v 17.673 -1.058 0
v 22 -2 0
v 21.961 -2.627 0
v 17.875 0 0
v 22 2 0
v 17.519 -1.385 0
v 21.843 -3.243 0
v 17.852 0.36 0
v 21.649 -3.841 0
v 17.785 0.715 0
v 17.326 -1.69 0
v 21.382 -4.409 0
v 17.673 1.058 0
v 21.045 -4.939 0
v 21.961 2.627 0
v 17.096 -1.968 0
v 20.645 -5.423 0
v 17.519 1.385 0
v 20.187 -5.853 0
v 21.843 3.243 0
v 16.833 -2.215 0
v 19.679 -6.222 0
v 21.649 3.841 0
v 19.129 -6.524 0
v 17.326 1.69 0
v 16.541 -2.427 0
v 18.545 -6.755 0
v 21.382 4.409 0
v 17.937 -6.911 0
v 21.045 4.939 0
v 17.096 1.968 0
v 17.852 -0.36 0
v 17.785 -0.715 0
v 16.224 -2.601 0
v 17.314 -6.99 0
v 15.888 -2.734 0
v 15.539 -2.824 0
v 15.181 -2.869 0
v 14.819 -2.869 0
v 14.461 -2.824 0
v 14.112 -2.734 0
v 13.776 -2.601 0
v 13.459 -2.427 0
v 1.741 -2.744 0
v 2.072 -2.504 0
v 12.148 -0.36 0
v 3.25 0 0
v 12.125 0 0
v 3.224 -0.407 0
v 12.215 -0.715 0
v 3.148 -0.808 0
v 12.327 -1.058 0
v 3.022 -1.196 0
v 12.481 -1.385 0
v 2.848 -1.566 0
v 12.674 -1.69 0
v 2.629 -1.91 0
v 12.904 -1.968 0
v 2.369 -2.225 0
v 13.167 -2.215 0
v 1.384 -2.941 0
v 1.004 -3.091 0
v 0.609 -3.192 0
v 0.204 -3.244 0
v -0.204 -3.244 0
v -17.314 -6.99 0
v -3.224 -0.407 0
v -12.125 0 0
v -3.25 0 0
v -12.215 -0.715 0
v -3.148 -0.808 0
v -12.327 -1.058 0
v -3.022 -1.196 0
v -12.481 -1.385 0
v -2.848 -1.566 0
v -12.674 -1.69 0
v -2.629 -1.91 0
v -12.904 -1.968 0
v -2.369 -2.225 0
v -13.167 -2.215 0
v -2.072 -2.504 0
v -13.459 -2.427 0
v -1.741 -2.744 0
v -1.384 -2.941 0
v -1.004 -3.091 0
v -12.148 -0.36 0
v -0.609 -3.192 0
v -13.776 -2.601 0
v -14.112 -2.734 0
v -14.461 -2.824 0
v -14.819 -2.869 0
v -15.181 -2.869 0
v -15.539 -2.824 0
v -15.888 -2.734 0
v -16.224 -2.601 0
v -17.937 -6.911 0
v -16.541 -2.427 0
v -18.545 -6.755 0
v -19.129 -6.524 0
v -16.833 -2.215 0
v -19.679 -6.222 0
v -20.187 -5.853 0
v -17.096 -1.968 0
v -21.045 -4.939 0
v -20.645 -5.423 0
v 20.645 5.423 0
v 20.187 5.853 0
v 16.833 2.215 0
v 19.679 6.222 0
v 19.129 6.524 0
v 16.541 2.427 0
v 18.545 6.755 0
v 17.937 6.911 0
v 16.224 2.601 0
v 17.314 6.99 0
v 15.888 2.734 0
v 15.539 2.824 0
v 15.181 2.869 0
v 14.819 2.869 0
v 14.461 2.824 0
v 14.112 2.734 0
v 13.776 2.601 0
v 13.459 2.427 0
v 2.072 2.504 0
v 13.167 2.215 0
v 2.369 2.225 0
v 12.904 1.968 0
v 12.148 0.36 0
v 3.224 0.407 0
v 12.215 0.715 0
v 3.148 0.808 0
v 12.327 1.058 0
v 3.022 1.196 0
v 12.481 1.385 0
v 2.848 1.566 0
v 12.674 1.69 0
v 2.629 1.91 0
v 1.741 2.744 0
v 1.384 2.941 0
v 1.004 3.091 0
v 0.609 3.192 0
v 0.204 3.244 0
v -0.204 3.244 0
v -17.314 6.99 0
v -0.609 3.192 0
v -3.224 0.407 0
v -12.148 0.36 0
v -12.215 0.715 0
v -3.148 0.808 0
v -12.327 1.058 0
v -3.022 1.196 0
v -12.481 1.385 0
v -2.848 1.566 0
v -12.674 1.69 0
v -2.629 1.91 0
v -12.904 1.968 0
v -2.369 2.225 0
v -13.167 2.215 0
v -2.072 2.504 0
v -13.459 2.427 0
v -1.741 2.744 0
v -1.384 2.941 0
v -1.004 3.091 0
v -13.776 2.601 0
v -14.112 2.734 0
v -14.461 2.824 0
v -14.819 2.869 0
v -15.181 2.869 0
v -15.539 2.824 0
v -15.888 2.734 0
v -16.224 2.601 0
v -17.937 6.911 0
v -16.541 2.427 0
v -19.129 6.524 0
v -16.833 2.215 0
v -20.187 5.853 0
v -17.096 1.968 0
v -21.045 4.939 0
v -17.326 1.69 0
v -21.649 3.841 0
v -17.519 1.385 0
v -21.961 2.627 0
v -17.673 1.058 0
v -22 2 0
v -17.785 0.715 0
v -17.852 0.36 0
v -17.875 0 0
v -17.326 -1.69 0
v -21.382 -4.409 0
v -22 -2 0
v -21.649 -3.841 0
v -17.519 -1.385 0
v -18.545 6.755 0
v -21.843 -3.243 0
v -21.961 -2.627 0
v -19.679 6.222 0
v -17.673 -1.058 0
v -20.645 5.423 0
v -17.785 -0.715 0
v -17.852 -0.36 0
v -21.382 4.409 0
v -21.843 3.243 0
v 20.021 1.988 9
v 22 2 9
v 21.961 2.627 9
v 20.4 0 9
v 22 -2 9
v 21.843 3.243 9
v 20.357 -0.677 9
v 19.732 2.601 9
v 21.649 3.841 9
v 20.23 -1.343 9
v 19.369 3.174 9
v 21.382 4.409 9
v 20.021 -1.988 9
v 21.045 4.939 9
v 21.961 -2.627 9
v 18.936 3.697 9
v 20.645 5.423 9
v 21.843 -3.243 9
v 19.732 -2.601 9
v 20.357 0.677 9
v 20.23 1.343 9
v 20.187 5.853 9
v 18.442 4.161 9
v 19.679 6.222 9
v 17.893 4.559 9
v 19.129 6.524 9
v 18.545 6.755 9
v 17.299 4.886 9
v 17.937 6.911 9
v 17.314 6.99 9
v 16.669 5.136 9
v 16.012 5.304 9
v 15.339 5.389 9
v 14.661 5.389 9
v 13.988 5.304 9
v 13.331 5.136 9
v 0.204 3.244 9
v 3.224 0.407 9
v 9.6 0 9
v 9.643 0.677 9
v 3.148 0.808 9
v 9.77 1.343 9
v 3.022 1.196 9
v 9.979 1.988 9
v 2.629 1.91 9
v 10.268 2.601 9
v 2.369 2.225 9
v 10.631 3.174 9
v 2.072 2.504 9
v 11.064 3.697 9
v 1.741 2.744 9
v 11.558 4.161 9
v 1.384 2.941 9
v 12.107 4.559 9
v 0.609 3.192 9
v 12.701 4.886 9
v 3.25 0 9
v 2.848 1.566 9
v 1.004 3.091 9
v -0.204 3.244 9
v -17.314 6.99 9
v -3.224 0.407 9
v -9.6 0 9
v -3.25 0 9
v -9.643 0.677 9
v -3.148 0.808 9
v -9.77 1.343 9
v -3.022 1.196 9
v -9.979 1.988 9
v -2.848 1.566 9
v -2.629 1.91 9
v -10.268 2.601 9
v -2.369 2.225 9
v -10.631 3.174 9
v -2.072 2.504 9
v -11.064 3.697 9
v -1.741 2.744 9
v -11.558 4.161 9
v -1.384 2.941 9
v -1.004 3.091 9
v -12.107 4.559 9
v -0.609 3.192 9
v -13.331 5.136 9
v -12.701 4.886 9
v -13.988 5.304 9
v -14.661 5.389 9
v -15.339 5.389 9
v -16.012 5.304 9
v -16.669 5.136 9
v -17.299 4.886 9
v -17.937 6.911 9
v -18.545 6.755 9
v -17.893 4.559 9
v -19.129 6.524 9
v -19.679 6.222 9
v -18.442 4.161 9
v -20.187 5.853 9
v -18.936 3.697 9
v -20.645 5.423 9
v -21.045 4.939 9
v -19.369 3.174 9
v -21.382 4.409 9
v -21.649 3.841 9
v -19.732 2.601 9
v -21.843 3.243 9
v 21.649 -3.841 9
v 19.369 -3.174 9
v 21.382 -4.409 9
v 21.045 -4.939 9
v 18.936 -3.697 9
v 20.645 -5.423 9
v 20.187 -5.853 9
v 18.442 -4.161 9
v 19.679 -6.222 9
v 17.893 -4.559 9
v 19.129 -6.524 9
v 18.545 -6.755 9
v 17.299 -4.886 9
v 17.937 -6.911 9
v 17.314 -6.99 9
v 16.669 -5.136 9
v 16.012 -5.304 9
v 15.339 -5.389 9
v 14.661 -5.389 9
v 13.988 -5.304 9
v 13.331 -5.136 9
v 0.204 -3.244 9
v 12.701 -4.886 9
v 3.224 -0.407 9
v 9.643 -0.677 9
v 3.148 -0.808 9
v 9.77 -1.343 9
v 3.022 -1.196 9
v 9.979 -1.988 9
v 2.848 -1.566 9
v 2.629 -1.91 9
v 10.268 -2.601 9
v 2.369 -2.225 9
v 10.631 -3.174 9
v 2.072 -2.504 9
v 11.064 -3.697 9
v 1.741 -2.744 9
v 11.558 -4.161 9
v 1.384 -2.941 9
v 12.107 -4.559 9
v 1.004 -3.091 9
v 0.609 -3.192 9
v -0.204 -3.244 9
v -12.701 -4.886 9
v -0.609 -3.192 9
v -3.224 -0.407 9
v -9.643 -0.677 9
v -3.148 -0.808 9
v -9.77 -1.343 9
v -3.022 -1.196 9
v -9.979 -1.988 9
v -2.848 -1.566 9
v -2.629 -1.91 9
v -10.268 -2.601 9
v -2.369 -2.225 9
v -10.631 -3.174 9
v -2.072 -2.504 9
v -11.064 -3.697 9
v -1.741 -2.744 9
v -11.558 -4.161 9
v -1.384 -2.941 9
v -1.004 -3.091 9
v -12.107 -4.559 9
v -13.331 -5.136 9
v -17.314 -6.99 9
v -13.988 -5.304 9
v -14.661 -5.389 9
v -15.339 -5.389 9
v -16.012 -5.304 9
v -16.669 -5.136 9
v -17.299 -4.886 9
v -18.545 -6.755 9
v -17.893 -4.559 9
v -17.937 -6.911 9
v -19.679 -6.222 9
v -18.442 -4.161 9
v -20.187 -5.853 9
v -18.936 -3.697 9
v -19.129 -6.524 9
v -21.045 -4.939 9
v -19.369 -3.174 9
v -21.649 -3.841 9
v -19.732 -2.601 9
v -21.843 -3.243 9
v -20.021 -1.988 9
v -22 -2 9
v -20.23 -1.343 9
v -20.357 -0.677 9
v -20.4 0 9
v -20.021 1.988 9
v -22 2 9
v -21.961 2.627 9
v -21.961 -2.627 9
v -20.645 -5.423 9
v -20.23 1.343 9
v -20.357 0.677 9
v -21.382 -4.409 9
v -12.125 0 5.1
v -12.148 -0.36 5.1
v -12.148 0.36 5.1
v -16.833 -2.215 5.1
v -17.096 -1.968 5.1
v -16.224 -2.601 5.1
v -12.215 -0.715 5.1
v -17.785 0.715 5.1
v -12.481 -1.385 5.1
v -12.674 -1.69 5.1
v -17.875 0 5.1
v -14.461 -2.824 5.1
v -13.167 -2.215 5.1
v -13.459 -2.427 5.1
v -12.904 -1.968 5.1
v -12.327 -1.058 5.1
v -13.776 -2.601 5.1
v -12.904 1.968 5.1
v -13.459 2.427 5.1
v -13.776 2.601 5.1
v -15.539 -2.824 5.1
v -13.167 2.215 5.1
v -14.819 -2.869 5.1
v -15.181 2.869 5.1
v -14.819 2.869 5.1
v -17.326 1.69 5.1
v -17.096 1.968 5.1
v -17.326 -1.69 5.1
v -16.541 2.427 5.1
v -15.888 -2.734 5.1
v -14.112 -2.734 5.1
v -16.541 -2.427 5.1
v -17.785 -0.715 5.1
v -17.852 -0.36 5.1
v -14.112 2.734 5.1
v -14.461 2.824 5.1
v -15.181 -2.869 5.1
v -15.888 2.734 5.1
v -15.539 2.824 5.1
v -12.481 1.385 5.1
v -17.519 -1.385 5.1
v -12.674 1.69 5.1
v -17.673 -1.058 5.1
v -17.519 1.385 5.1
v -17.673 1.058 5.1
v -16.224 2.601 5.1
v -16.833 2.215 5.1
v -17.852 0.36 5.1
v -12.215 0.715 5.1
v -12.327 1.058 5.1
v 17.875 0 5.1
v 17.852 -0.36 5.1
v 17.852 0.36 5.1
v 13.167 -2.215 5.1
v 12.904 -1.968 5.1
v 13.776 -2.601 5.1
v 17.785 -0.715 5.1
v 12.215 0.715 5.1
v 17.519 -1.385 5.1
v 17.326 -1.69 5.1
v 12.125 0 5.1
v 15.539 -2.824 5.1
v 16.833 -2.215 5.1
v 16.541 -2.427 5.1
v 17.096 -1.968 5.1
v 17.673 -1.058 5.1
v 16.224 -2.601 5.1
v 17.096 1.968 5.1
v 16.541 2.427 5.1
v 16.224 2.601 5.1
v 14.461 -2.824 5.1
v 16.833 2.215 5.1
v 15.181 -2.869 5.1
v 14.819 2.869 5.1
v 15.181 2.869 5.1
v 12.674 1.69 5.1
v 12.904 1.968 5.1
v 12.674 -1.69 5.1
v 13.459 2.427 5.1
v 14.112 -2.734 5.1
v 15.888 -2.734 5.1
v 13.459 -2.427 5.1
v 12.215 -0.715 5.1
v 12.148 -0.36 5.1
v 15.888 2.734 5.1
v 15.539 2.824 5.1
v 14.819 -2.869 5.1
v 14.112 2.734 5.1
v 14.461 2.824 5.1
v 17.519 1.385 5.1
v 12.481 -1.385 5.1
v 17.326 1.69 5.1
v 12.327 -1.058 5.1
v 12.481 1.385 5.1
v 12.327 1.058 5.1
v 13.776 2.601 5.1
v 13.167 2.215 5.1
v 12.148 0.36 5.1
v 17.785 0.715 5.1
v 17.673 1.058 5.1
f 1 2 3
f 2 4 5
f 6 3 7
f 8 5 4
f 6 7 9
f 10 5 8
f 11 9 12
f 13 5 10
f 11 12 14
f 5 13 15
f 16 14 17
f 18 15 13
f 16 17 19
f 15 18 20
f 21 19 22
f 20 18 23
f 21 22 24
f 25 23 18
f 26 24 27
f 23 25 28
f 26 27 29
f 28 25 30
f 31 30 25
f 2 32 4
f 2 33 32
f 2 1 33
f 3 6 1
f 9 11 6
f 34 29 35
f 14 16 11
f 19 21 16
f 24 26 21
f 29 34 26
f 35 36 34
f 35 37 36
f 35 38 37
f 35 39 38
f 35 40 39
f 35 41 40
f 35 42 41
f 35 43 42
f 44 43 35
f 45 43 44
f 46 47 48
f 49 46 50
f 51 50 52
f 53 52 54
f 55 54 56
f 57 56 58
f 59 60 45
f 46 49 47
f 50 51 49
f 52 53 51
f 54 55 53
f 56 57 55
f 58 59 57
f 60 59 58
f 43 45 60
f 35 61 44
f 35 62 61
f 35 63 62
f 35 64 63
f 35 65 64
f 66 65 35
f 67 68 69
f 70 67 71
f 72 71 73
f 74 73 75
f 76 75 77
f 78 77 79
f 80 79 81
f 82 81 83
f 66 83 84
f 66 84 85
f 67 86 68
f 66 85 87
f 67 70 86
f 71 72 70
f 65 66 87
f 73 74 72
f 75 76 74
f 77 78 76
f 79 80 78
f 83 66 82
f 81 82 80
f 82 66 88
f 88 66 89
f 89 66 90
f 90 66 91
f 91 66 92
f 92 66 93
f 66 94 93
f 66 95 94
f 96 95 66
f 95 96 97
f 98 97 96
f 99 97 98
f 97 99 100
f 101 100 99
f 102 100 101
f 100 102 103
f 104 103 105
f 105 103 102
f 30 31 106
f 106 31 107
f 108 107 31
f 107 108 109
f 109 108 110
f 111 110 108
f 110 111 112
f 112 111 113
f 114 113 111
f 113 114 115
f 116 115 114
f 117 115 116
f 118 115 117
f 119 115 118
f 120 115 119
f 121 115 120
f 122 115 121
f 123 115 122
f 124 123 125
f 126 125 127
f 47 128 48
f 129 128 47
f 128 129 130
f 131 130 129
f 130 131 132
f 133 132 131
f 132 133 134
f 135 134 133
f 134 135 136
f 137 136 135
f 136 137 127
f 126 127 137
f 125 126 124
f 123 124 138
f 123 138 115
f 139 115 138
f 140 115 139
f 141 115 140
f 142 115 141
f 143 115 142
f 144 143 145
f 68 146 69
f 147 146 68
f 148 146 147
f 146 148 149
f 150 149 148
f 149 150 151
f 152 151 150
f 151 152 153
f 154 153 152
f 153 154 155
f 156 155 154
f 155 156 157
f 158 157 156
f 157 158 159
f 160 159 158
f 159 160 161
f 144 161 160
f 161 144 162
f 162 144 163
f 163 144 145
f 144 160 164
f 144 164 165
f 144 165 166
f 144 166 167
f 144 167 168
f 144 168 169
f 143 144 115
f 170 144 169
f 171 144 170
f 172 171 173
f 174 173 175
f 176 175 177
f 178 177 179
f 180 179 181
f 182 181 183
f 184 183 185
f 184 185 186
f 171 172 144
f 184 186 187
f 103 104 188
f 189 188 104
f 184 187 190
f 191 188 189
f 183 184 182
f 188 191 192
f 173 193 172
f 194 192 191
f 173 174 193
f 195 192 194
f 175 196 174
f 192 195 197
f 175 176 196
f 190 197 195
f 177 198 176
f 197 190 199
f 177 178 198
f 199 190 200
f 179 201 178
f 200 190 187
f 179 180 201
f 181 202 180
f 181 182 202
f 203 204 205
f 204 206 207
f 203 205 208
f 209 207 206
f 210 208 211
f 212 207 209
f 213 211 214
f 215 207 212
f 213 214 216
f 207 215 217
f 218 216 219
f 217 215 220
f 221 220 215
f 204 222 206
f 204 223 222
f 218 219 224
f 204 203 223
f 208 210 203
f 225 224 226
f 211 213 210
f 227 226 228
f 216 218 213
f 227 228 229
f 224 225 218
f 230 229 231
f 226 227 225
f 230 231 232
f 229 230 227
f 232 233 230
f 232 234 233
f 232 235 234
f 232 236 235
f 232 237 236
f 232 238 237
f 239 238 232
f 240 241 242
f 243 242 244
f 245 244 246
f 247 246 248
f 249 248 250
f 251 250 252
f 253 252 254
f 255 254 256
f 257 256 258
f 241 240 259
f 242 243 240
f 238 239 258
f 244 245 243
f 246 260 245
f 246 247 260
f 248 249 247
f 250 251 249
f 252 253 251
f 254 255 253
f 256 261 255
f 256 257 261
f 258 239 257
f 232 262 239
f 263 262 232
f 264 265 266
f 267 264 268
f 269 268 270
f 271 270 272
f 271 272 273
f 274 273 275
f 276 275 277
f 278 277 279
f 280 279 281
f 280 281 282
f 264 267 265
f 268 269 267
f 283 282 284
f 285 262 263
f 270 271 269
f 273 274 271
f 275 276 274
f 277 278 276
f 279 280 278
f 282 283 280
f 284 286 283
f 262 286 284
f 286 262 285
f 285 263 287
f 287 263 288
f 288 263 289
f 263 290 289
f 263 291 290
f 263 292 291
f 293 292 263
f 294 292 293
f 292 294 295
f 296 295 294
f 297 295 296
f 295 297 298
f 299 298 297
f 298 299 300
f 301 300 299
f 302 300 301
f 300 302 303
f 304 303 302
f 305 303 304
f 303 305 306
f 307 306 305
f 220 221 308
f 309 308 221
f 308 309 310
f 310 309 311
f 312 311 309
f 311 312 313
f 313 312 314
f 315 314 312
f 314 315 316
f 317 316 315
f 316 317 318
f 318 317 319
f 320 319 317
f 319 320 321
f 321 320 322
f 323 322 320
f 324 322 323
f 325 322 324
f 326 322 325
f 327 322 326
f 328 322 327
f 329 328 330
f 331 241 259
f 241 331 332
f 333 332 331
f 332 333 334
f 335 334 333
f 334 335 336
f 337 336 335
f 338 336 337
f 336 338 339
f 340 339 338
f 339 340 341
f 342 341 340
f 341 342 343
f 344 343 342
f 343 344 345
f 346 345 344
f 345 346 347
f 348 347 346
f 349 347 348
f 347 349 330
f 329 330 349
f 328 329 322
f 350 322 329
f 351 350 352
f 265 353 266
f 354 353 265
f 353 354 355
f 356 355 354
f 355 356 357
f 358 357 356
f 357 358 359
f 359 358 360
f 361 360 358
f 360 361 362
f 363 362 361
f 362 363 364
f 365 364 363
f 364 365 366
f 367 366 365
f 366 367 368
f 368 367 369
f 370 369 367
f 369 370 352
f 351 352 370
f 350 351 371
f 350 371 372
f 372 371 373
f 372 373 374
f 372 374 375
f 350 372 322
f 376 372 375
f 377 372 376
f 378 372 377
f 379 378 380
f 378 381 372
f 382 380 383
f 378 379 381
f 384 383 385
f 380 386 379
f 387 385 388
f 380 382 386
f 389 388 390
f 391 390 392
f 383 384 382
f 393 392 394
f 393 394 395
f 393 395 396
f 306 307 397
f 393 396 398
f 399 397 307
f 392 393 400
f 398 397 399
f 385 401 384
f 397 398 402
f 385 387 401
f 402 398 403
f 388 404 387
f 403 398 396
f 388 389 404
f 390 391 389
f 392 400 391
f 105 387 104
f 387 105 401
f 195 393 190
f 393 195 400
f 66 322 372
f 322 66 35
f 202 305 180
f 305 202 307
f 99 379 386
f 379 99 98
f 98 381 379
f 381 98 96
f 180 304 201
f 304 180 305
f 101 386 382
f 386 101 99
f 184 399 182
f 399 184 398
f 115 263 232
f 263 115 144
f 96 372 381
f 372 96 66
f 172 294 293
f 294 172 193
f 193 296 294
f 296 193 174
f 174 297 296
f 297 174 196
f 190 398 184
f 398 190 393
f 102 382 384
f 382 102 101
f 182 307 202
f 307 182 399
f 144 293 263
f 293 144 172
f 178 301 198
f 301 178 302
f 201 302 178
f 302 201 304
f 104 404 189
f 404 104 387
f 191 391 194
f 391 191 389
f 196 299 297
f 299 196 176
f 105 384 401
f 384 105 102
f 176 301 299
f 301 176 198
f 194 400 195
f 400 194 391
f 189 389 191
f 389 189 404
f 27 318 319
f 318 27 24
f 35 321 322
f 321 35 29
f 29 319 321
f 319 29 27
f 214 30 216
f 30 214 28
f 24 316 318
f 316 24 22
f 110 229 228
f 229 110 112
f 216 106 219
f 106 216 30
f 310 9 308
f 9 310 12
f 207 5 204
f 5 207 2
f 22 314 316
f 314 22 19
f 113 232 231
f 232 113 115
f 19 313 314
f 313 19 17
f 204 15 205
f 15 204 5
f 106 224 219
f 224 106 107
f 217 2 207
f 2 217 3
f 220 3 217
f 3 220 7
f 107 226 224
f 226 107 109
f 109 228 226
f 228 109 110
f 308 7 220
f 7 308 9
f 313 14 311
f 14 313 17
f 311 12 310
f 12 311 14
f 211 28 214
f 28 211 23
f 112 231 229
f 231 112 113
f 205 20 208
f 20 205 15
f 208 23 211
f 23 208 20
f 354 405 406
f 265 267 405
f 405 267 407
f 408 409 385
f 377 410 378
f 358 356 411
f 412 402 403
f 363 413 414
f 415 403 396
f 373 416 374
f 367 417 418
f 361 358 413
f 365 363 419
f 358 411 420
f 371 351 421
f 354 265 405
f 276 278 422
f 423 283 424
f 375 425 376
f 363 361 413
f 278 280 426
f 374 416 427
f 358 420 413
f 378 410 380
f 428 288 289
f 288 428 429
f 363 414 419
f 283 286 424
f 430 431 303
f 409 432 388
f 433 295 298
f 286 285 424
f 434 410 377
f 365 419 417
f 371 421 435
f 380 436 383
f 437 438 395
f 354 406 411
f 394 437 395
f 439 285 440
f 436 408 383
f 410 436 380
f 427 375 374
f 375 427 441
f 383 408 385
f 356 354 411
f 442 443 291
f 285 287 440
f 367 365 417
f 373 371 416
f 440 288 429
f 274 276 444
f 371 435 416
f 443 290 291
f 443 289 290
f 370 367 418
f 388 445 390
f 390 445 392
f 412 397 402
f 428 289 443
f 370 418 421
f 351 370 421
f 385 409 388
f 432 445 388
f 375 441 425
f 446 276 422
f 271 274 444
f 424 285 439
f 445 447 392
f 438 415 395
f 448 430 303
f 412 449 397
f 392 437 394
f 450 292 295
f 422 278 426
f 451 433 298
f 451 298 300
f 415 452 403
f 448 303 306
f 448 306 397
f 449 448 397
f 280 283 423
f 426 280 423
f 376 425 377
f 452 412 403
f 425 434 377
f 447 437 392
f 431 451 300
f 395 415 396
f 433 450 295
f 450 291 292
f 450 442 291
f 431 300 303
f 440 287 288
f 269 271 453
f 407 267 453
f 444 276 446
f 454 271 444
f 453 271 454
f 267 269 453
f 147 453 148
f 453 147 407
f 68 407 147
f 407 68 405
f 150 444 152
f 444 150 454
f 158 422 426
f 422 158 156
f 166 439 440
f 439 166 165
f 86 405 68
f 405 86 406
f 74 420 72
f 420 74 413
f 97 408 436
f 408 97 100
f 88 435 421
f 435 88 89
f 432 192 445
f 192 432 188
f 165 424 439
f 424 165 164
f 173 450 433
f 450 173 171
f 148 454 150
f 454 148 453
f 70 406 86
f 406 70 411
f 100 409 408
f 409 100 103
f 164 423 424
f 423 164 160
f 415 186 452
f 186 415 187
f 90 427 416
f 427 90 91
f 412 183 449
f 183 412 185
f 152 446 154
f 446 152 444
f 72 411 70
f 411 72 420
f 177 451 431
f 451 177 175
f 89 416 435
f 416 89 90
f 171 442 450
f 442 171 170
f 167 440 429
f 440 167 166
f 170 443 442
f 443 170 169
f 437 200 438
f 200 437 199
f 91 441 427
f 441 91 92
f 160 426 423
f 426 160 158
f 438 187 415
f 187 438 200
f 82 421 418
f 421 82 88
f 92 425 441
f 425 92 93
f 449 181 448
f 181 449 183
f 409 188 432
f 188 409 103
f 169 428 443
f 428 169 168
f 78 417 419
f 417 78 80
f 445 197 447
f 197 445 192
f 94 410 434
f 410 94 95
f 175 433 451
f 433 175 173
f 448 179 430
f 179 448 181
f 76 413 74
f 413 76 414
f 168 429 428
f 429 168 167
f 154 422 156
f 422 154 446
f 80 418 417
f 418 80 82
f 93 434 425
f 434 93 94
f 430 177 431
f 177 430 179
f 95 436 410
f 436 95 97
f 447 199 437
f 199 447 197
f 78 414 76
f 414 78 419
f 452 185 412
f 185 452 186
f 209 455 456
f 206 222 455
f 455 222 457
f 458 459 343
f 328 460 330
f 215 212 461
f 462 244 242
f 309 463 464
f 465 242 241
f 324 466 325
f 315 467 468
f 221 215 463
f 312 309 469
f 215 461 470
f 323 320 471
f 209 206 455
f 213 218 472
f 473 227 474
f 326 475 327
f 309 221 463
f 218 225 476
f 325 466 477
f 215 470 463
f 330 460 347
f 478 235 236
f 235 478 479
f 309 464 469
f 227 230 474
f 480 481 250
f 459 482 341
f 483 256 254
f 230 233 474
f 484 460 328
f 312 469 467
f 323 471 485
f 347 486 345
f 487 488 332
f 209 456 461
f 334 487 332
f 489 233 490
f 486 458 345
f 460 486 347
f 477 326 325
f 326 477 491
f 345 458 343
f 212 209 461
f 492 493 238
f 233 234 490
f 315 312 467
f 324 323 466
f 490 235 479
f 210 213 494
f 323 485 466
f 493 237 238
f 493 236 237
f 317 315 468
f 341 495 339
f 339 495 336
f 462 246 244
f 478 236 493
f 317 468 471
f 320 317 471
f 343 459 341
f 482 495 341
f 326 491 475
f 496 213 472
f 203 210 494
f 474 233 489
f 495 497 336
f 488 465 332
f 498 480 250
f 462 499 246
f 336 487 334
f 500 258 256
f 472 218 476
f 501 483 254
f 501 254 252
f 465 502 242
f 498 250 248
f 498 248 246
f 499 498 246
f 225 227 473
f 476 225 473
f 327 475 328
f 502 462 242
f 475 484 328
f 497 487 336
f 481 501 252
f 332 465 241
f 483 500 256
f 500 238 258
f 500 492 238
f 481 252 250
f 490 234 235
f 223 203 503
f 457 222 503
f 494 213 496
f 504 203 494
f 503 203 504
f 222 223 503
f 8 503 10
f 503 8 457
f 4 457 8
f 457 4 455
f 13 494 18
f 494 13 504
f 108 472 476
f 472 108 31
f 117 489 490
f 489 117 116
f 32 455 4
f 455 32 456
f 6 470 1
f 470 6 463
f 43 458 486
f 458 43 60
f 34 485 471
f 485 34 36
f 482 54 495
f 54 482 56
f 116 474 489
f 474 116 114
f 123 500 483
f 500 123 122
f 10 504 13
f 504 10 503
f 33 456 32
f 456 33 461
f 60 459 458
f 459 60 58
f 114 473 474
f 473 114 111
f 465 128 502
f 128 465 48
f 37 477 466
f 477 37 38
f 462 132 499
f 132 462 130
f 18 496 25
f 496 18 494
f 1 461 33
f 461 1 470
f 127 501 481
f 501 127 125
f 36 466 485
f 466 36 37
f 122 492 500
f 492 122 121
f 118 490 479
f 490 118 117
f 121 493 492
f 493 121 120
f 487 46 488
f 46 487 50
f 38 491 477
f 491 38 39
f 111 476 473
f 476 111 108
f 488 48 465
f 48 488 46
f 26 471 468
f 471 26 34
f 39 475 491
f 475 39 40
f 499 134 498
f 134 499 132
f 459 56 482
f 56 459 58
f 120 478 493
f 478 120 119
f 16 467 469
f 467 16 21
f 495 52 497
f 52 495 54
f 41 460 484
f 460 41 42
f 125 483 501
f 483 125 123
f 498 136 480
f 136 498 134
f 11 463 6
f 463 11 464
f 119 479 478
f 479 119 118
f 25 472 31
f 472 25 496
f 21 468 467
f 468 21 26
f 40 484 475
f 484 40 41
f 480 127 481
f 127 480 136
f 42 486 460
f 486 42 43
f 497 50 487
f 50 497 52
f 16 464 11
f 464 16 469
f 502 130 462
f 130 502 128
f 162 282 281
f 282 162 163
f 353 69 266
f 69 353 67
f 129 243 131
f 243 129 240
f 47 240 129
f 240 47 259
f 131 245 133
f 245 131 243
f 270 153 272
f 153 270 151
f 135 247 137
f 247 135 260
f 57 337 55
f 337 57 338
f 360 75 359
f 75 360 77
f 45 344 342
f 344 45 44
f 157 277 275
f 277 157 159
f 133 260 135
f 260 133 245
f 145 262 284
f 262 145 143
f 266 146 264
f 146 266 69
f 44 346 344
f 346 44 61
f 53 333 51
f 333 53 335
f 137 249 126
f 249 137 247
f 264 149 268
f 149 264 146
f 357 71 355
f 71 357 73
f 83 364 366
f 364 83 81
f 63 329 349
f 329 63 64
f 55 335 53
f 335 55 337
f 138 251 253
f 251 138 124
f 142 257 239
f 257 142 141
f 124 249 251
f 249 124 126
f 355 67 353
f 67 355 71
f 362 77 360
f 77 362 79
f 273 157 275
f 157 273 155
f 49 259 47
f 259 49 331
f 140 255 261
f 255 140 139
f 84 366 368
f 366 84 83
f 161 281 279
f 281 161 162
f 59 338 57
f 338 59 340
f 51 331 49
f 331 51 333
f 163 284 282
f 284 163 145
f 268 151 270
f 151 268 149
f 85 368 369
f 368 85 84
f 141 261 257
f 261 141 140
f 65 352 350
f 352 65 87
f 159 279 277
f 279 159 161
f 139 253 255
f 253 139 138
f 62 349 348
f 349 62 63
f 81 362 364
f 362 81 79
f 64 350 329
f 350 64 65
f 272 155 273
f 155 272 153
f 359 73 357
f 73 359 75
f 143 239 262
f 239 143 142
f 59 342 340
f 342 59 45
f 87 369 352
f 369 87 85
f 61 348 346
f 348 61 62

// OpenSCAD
$fn = 50;


difference() {
	union() {
		cylinder(h = 9, r = 7.0000000000);
		translate(v = [-7.5000000000, 0.0000000000, 0]) {
			hull() {
				translate(v = [-9.5000000000, 2.0000000000, 0]) {
					cylinder(h = 9, r = 5);
				}
				translate(v = [9.5000000000, 2.0000000000, 0]) {
					cylinder(h = 9, r = 5);
				}
				translate(v = [-9.5000000000, -2.0000000000, 0]) {
					cylinder(h = 9, r = 5);
				}
				translate(v = [9.5000000000, -2.0000000000, 0]) {
					cylinder(h = 9, r = 5);
				}
			}
		}
		translate(v = [-7.5000000000, 0.0000000000, 0]) {
			hull() {
				translate(v = [-9.5000000000, 2.0000000000, 0]) {
					cylinder(h = 9, r = 5);
				}
				translate(v = [9.5000000000, 2.0000000000, 0]) {
					cylinder(h = 9, r = 5);
				}
				translate(v = [-9.5000000000, -2.0000000000, 0]) {
					cylinder(h = 9, r = 5);
				}
				translate(v = [9.5000000000, -2.0000000000, 0]) {
					cylinder(h = 9, r = 5);
				}
			}
		}
		translate(v = [7.5000000000, 0.0000000000, 0]) {
			hull() {
				translate(v = [-9.5000000000, 2.0000000000, 0]) {
					cylinder(h = 9, r = 5);
				}
				translate(v = [9.5000000000, 2.0000000000, 0]) {
					cylinder(h = 9, r = 5);
				}
				translate(v = [-9.5000000000, -2.0000000000, 0]) {
					cylinder(h = 9, r = 5);
				}
				translate(v = [9.5000000000, -2.0000000000, 0]) {
					cylinder(h = 9, r = 5);
				}
			}
		}
		translate(v = [7.5000000000, 0.0000000000, 0]) {
			hull() {
				translate(v = [-9.5000000000, 2.0000000000, 0]) {
					cylinder(h = 9, r = 5);
				}
				translate(v = [9.5000000000, 2.0000000000, 0]) {
					cylinder(h = 9, r = 5);
				}
				translate(v = [-9.5000000000, -2.0000000000, 0]) {
					cylinder(h = 9, r = 5);
				}
				translate(v = [9.5000000000, -2.0000000000, 0]) {
					cylinder(h = 9, r = 5);
				}
			}
		}
	}
	union() {
		translate(v = [-15.0000000000, 0.0000000000, 9]) {
			rotate(a = [0, 0, 0]) {
				difference() {
					union() {
						#translate(v = [0, 0, -9.0000000000]) {
							cylinder(h = 9, r = 2.6000000000);
						}
						#translate(v = [0, 0, -3.9000000000]) {
							cylinder(h = 3.9000000000, r1 = 2.8750000000, r2 = 5.4000000000);
						}
						#translate(v = [0, 0, -9.0000000000]) {
							cylinder(h = 9, r = 2.8750000000);
						}
						#translate(v = [0, 0, -9.0000000000]) {
							cylinder(h = 9, r = 2.6000000000);
						}
					}
					union();
				}
			}
		}
		translate(v = [-15.0000000000, 0.0000000000, 9]) {
			rotate(a = [0, 0, 0]) {
				difference() {
					union() {
						#translate(v = [0, 0, -9.0000000000]) {
							cylinder(h = 9, r = 2.6000000000);
						}
						#translate(v = [0, 0, -3.9000000000]) {
							cylinder(h = 3.9000000000, r1 = 2.8750000000, r2 = 5.4000000000);
						}
						#translate(v = [0, 0, -9.0000000000]) {
							cylinder(h = 9, r = 2.8750000000);
						}
						#translate(v = [0, 0, -9.0000000000]) {
							cylinder(h = 9, r = 2.6000000000);
						}
					}
					union();
				}
			}
		}
		translate(v = [15.0000000000, 0.0000000000, 9]) {
			rotate(a = [0, 0, 0]) {
				difference() {
					union() {
						#translate(v = [0, 0, -9.0000000000]) {
							cylinder(h = 9, r = 2.6000000000);
						}
						#translate(v = [0, 0, -3.9000000000]) {
							cylinder(h = 3.9000000000, r1 = 2.8750000000, r2 = 5.4000000000);
						}
						#translate(v = [0, 0, -9.0000000000]) {
							cylinder(h = 9, r = 2.8750000000);
						}
						#translate(v = [0, 0, -9.0000000000]) {
							cylinder(h = 9, r = 2.6000000000);
						}
					}
					union();
				}
			}
		}
		translate(v = [15.0000000000, 0.0000000000, 9]) {
			rotate(a = [0, 0, 0]) {
				difference() {
					union() {
						#translate(v = [0, 0, -9.0000000000]) {
							cylinder(h = 9, r = 2.6000000000);
						}
						#translate(v = [0, 0, -3.9000000000]) {
							cylinder(h = 3.9000000000, r1 = 2.8750000000, r2 = 5.4000000000);
						}
						#translate(v = [0, 0, -9.0000000000]) {
							cylinder(h = 9, r = 2.8750000000);
						}
						#translate(v = [0, 0, -9.0000000000]) {
							cylinder(h = 9, r = 2.6000000000);
						}
					}
					union();
				}
			}
		}
		translate(v = [0, 0, -100]) {
			cylinder(h = 200, r = 3.2500000000);
		}
		translate(v = [0, 0, -100]) {
			cylinder(h = 200, r = 1.8000000000);
		}
	}
}
